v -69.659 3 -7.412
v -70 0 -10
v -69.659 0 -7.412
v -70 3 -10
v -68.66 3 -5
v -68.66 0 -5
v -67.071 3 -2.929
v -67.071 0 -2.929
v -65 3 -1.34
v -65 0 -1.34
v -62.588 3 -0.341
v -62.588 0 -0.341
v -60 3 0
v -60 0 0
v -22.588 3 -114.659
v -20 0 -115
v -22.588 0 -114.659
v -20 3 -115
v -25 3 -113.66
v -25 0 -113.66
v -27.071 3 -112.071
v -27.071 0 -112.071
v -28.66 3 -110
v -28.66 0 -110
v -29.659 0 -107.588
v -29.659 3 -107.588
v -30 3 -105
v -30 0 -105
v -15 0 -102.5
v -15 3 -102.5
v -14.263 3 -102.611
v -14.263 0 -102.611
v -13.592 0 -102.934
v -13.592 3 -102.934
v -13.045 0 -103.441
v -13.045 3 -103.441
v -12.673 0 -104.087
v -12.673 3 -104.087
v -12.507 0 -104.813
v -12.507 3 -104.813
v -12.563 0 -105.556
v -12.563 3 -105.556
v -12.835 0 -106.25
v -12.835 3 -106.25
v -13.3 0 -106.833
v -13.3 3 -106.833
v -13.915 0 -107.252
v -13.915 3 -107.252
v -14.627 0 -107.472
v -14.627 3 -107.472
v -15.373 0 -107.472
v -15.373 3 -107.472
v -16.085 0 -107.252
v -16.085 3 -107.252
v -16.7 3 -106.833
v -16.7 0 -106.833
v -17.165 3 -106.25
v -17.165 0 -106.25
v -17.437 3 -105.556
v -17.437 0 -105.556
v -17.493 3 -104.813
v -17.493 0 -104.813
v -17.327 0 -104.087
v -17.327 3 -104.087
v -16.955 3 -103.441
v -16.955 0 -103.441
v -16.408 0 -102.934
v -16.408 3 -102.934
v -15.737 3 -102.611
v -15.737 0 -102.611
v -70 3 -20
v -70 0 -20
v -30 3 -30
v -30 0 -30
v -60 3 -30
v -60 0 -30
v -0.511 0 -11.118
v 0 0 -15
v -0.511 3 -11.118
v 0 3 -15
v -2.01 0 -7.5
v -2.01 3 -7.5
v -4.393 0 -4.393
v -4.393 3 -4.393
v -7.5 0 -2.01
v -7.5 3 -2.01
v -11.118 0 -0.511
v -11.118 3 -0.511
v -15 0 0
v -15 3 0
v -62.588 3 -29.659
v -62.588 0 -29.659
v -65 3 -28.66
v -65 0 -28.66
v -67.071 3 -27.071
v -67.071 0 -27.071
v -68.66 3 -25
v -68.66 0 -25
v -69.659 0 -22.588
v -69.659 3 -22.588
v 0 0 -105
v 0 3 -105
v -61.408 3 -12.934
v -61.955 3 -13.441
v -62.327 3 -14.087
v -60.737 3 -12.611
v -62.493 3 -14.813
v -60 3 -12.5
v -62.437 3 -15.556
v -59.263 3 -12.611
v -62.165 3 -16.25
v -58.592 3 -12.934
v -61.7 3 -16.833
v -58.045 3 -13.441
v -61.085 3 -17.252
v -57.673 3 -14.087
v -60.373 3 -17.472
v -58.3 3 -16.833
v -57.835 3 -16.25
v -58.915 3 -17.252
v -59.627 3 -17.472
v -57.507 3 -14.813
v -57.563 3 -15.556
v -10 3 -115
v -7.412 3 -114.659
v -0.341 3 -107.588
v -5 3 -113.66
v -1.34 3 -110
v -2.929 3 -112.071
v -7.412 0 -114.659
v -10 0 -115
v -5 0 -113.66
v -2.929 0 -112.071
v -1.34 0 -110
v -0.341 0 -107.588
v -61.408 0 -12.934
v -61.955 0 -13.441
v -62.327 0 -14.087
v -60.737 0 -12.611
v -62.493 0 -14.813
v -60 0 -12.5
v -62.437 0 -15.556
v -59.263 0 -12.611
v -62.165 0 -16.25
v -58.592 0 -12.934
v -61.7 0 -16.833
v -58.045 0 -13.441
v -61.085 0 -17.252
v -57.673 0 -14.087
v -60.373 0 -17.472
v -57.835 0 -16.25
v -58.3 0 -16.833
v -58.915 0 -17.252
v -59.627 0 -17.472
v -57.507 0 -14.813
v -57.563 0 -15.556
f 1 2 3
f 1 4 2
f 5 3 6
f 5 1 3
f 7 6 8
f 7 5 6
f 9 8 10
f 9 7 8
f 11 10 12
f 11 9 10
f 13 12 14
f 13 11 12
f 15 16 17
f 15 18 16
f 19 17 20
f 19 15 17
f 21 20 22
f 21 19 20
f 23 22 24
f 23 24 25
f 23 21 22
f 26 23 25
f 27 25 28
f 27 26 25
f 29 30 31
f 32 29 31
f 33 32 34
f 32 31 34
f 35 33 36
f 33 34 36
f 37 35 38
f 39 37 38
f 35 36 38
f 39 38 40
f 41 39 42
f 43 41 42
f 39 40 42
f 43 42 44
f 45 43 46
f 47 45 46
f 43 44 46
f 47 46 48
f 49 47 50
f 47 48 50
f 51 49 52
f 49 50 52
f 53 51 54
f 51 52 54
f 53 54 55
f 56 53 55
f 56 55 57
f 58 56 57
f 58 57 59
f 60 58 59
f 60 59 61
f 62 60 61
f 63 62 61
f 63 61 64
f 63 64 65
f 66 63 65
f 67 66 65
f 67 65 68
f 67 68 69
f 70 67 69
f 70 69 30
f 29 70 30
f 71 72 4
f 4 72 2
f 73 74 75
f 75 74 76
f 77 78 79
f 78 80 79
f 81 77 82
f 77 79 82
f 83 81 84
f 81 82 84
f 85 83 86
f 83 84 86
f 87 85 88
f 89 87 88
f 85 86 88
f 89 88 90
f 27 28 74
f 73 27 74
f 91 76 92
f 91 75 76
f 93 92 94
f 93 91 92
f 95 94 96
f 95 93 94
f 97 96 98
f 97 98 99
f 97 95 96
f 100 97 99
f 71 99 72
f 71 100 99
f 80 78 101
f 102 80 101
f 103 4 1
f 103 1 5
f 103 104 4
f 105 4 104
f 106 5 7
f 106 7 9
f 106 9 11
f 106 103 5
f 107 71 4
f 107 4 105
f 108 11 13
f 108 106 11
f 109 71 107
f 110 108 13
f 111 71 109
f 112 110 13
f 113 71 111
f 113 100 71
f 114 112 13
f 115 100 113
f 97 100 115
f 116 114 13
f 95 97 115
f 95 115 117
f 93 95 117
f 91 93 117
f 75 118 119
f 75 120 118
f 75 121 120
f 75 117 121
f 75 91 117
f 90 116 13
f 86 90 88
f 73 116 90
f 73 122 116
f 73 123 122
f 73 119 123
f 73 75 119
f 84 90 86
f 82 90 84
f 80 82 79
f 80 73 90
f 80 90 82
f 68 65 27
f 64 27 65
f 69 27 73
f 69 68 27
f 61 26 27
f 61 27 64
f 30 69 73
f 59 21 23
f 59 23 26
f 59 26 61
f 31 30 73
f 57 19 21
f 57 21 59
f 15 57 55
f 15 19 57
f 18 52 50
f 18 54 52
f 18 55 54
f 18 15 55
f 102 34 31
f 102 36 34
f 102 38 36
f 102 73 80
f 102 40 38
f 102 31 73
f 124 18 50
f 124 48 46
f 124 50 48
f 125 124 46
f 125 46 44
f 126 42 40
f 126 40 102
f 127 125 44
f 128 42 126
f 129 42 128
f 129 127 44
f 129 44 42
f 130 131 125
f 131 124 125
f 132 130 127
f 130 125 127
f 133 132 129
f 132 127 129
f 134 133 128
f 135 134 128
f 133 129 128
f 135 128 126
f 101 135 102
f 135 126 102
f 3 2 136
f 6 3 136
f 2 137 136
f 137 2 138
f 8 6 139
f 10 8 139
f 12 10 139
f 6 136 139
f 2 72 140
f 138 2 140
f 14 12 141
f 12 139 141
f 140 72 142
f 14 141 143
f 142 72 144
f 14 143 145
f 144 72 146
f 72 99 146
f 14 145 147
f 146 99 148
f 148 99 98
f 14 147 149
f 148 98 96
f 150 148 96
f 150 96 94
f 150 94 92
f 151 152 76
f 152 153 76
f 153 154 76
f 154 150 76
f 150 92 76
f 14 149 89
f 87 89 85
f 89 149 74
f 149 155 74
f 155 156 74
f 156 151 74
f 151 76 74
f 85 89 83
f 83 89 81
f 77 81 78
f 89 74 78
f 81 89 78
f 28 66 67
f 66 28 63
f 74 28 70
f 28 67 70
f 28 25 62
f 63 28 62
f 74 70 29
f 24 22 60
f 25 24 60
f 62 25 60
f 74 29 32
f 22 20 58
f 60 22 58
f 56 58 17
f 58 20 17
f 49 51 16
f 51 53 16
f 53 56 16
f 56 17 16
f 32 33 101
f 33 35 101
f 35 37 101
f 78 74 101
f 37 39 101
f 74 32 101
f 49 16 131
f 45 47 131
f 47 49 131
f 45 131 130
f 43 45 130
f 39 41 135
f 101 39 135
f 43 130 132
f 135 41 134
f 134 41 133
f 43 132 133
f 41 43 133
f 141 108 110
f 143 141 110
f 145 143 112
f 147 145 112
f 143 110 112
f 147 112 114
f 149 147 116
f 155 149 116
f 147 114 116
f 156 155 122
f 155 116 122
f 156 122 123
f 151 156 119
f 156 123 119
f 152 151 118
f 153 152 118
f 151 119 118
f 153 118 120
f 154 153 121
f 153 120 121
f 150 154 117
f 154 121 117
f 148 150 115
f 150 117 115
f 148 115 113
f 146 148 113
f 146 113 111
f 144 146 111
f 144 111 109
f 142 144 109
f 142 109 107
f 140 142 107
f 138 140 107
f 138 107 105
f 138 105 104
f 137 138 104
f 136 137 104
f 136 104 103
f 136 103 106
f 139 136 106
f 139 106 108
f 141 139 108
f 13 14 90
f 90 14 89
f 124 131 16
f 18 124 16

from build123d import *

# Parameters (mm, degrees)
BOSS_EXTRUDE1_DEPTH = 3
FILLET1_R           = 10
FILLET2_R           = 15
SKETCH2_R           = 2.5
CUT_EXTRUDE1_DEPTH  = 135.662541191


with BuildPart() as part:
    # Sketch1 → Boss-Extrude1 (new body)
    with BuildSketch(Plane(origin=(0, 0, 0), x_dir=(1, 0, 0), z_dir=(0, 1, 0))):
        Polygon((0, 115), (-30, 115), (-30, 30), (-70, 30), (-70, 0), (0, 0), align=None)
    extrude(amount=BOSS_EXTRUDE1_DEPTH)

    # Fillet1
    fillet1_edges = [part.edges().sort_by_distance(p)[0] for p in [
        (0, 1.5, -115),
        (-30, 1.5, -115),
        (-70, 1.5, -30),
        (-70, 1.5, 0),
    ]]
    fillet(fillet1_edges, radius=FILLET1_R)

    # Fillet2
    fillet2_edges = [part.edges().sort_by_distance(p)[0] for p in [
        (0, 1.5, 0),
    ]]
    fillet(fillet2_edges, radius=FILLET2_R)

    # Sketch2 → Cut-Extrude1 (cut, through all)
    with BuildSketch(Plane(origin=(0, 3, 0), x_dir=(1, 0, 0), z_dir=(0, 1, 0))):
        with Locations(Location((-60, 15, 0), (0, 0, 270))):
            Circle(SKETCH2_R)
        with Locations(Location((-15, 105, 0), (0, 0, 270))):
            Circle(SKETCH2_R)
    extrude(amount=-CUT_EXTRUDE1_DEPTH, mode=Mode.SUBTRACT)


solid = part.part
